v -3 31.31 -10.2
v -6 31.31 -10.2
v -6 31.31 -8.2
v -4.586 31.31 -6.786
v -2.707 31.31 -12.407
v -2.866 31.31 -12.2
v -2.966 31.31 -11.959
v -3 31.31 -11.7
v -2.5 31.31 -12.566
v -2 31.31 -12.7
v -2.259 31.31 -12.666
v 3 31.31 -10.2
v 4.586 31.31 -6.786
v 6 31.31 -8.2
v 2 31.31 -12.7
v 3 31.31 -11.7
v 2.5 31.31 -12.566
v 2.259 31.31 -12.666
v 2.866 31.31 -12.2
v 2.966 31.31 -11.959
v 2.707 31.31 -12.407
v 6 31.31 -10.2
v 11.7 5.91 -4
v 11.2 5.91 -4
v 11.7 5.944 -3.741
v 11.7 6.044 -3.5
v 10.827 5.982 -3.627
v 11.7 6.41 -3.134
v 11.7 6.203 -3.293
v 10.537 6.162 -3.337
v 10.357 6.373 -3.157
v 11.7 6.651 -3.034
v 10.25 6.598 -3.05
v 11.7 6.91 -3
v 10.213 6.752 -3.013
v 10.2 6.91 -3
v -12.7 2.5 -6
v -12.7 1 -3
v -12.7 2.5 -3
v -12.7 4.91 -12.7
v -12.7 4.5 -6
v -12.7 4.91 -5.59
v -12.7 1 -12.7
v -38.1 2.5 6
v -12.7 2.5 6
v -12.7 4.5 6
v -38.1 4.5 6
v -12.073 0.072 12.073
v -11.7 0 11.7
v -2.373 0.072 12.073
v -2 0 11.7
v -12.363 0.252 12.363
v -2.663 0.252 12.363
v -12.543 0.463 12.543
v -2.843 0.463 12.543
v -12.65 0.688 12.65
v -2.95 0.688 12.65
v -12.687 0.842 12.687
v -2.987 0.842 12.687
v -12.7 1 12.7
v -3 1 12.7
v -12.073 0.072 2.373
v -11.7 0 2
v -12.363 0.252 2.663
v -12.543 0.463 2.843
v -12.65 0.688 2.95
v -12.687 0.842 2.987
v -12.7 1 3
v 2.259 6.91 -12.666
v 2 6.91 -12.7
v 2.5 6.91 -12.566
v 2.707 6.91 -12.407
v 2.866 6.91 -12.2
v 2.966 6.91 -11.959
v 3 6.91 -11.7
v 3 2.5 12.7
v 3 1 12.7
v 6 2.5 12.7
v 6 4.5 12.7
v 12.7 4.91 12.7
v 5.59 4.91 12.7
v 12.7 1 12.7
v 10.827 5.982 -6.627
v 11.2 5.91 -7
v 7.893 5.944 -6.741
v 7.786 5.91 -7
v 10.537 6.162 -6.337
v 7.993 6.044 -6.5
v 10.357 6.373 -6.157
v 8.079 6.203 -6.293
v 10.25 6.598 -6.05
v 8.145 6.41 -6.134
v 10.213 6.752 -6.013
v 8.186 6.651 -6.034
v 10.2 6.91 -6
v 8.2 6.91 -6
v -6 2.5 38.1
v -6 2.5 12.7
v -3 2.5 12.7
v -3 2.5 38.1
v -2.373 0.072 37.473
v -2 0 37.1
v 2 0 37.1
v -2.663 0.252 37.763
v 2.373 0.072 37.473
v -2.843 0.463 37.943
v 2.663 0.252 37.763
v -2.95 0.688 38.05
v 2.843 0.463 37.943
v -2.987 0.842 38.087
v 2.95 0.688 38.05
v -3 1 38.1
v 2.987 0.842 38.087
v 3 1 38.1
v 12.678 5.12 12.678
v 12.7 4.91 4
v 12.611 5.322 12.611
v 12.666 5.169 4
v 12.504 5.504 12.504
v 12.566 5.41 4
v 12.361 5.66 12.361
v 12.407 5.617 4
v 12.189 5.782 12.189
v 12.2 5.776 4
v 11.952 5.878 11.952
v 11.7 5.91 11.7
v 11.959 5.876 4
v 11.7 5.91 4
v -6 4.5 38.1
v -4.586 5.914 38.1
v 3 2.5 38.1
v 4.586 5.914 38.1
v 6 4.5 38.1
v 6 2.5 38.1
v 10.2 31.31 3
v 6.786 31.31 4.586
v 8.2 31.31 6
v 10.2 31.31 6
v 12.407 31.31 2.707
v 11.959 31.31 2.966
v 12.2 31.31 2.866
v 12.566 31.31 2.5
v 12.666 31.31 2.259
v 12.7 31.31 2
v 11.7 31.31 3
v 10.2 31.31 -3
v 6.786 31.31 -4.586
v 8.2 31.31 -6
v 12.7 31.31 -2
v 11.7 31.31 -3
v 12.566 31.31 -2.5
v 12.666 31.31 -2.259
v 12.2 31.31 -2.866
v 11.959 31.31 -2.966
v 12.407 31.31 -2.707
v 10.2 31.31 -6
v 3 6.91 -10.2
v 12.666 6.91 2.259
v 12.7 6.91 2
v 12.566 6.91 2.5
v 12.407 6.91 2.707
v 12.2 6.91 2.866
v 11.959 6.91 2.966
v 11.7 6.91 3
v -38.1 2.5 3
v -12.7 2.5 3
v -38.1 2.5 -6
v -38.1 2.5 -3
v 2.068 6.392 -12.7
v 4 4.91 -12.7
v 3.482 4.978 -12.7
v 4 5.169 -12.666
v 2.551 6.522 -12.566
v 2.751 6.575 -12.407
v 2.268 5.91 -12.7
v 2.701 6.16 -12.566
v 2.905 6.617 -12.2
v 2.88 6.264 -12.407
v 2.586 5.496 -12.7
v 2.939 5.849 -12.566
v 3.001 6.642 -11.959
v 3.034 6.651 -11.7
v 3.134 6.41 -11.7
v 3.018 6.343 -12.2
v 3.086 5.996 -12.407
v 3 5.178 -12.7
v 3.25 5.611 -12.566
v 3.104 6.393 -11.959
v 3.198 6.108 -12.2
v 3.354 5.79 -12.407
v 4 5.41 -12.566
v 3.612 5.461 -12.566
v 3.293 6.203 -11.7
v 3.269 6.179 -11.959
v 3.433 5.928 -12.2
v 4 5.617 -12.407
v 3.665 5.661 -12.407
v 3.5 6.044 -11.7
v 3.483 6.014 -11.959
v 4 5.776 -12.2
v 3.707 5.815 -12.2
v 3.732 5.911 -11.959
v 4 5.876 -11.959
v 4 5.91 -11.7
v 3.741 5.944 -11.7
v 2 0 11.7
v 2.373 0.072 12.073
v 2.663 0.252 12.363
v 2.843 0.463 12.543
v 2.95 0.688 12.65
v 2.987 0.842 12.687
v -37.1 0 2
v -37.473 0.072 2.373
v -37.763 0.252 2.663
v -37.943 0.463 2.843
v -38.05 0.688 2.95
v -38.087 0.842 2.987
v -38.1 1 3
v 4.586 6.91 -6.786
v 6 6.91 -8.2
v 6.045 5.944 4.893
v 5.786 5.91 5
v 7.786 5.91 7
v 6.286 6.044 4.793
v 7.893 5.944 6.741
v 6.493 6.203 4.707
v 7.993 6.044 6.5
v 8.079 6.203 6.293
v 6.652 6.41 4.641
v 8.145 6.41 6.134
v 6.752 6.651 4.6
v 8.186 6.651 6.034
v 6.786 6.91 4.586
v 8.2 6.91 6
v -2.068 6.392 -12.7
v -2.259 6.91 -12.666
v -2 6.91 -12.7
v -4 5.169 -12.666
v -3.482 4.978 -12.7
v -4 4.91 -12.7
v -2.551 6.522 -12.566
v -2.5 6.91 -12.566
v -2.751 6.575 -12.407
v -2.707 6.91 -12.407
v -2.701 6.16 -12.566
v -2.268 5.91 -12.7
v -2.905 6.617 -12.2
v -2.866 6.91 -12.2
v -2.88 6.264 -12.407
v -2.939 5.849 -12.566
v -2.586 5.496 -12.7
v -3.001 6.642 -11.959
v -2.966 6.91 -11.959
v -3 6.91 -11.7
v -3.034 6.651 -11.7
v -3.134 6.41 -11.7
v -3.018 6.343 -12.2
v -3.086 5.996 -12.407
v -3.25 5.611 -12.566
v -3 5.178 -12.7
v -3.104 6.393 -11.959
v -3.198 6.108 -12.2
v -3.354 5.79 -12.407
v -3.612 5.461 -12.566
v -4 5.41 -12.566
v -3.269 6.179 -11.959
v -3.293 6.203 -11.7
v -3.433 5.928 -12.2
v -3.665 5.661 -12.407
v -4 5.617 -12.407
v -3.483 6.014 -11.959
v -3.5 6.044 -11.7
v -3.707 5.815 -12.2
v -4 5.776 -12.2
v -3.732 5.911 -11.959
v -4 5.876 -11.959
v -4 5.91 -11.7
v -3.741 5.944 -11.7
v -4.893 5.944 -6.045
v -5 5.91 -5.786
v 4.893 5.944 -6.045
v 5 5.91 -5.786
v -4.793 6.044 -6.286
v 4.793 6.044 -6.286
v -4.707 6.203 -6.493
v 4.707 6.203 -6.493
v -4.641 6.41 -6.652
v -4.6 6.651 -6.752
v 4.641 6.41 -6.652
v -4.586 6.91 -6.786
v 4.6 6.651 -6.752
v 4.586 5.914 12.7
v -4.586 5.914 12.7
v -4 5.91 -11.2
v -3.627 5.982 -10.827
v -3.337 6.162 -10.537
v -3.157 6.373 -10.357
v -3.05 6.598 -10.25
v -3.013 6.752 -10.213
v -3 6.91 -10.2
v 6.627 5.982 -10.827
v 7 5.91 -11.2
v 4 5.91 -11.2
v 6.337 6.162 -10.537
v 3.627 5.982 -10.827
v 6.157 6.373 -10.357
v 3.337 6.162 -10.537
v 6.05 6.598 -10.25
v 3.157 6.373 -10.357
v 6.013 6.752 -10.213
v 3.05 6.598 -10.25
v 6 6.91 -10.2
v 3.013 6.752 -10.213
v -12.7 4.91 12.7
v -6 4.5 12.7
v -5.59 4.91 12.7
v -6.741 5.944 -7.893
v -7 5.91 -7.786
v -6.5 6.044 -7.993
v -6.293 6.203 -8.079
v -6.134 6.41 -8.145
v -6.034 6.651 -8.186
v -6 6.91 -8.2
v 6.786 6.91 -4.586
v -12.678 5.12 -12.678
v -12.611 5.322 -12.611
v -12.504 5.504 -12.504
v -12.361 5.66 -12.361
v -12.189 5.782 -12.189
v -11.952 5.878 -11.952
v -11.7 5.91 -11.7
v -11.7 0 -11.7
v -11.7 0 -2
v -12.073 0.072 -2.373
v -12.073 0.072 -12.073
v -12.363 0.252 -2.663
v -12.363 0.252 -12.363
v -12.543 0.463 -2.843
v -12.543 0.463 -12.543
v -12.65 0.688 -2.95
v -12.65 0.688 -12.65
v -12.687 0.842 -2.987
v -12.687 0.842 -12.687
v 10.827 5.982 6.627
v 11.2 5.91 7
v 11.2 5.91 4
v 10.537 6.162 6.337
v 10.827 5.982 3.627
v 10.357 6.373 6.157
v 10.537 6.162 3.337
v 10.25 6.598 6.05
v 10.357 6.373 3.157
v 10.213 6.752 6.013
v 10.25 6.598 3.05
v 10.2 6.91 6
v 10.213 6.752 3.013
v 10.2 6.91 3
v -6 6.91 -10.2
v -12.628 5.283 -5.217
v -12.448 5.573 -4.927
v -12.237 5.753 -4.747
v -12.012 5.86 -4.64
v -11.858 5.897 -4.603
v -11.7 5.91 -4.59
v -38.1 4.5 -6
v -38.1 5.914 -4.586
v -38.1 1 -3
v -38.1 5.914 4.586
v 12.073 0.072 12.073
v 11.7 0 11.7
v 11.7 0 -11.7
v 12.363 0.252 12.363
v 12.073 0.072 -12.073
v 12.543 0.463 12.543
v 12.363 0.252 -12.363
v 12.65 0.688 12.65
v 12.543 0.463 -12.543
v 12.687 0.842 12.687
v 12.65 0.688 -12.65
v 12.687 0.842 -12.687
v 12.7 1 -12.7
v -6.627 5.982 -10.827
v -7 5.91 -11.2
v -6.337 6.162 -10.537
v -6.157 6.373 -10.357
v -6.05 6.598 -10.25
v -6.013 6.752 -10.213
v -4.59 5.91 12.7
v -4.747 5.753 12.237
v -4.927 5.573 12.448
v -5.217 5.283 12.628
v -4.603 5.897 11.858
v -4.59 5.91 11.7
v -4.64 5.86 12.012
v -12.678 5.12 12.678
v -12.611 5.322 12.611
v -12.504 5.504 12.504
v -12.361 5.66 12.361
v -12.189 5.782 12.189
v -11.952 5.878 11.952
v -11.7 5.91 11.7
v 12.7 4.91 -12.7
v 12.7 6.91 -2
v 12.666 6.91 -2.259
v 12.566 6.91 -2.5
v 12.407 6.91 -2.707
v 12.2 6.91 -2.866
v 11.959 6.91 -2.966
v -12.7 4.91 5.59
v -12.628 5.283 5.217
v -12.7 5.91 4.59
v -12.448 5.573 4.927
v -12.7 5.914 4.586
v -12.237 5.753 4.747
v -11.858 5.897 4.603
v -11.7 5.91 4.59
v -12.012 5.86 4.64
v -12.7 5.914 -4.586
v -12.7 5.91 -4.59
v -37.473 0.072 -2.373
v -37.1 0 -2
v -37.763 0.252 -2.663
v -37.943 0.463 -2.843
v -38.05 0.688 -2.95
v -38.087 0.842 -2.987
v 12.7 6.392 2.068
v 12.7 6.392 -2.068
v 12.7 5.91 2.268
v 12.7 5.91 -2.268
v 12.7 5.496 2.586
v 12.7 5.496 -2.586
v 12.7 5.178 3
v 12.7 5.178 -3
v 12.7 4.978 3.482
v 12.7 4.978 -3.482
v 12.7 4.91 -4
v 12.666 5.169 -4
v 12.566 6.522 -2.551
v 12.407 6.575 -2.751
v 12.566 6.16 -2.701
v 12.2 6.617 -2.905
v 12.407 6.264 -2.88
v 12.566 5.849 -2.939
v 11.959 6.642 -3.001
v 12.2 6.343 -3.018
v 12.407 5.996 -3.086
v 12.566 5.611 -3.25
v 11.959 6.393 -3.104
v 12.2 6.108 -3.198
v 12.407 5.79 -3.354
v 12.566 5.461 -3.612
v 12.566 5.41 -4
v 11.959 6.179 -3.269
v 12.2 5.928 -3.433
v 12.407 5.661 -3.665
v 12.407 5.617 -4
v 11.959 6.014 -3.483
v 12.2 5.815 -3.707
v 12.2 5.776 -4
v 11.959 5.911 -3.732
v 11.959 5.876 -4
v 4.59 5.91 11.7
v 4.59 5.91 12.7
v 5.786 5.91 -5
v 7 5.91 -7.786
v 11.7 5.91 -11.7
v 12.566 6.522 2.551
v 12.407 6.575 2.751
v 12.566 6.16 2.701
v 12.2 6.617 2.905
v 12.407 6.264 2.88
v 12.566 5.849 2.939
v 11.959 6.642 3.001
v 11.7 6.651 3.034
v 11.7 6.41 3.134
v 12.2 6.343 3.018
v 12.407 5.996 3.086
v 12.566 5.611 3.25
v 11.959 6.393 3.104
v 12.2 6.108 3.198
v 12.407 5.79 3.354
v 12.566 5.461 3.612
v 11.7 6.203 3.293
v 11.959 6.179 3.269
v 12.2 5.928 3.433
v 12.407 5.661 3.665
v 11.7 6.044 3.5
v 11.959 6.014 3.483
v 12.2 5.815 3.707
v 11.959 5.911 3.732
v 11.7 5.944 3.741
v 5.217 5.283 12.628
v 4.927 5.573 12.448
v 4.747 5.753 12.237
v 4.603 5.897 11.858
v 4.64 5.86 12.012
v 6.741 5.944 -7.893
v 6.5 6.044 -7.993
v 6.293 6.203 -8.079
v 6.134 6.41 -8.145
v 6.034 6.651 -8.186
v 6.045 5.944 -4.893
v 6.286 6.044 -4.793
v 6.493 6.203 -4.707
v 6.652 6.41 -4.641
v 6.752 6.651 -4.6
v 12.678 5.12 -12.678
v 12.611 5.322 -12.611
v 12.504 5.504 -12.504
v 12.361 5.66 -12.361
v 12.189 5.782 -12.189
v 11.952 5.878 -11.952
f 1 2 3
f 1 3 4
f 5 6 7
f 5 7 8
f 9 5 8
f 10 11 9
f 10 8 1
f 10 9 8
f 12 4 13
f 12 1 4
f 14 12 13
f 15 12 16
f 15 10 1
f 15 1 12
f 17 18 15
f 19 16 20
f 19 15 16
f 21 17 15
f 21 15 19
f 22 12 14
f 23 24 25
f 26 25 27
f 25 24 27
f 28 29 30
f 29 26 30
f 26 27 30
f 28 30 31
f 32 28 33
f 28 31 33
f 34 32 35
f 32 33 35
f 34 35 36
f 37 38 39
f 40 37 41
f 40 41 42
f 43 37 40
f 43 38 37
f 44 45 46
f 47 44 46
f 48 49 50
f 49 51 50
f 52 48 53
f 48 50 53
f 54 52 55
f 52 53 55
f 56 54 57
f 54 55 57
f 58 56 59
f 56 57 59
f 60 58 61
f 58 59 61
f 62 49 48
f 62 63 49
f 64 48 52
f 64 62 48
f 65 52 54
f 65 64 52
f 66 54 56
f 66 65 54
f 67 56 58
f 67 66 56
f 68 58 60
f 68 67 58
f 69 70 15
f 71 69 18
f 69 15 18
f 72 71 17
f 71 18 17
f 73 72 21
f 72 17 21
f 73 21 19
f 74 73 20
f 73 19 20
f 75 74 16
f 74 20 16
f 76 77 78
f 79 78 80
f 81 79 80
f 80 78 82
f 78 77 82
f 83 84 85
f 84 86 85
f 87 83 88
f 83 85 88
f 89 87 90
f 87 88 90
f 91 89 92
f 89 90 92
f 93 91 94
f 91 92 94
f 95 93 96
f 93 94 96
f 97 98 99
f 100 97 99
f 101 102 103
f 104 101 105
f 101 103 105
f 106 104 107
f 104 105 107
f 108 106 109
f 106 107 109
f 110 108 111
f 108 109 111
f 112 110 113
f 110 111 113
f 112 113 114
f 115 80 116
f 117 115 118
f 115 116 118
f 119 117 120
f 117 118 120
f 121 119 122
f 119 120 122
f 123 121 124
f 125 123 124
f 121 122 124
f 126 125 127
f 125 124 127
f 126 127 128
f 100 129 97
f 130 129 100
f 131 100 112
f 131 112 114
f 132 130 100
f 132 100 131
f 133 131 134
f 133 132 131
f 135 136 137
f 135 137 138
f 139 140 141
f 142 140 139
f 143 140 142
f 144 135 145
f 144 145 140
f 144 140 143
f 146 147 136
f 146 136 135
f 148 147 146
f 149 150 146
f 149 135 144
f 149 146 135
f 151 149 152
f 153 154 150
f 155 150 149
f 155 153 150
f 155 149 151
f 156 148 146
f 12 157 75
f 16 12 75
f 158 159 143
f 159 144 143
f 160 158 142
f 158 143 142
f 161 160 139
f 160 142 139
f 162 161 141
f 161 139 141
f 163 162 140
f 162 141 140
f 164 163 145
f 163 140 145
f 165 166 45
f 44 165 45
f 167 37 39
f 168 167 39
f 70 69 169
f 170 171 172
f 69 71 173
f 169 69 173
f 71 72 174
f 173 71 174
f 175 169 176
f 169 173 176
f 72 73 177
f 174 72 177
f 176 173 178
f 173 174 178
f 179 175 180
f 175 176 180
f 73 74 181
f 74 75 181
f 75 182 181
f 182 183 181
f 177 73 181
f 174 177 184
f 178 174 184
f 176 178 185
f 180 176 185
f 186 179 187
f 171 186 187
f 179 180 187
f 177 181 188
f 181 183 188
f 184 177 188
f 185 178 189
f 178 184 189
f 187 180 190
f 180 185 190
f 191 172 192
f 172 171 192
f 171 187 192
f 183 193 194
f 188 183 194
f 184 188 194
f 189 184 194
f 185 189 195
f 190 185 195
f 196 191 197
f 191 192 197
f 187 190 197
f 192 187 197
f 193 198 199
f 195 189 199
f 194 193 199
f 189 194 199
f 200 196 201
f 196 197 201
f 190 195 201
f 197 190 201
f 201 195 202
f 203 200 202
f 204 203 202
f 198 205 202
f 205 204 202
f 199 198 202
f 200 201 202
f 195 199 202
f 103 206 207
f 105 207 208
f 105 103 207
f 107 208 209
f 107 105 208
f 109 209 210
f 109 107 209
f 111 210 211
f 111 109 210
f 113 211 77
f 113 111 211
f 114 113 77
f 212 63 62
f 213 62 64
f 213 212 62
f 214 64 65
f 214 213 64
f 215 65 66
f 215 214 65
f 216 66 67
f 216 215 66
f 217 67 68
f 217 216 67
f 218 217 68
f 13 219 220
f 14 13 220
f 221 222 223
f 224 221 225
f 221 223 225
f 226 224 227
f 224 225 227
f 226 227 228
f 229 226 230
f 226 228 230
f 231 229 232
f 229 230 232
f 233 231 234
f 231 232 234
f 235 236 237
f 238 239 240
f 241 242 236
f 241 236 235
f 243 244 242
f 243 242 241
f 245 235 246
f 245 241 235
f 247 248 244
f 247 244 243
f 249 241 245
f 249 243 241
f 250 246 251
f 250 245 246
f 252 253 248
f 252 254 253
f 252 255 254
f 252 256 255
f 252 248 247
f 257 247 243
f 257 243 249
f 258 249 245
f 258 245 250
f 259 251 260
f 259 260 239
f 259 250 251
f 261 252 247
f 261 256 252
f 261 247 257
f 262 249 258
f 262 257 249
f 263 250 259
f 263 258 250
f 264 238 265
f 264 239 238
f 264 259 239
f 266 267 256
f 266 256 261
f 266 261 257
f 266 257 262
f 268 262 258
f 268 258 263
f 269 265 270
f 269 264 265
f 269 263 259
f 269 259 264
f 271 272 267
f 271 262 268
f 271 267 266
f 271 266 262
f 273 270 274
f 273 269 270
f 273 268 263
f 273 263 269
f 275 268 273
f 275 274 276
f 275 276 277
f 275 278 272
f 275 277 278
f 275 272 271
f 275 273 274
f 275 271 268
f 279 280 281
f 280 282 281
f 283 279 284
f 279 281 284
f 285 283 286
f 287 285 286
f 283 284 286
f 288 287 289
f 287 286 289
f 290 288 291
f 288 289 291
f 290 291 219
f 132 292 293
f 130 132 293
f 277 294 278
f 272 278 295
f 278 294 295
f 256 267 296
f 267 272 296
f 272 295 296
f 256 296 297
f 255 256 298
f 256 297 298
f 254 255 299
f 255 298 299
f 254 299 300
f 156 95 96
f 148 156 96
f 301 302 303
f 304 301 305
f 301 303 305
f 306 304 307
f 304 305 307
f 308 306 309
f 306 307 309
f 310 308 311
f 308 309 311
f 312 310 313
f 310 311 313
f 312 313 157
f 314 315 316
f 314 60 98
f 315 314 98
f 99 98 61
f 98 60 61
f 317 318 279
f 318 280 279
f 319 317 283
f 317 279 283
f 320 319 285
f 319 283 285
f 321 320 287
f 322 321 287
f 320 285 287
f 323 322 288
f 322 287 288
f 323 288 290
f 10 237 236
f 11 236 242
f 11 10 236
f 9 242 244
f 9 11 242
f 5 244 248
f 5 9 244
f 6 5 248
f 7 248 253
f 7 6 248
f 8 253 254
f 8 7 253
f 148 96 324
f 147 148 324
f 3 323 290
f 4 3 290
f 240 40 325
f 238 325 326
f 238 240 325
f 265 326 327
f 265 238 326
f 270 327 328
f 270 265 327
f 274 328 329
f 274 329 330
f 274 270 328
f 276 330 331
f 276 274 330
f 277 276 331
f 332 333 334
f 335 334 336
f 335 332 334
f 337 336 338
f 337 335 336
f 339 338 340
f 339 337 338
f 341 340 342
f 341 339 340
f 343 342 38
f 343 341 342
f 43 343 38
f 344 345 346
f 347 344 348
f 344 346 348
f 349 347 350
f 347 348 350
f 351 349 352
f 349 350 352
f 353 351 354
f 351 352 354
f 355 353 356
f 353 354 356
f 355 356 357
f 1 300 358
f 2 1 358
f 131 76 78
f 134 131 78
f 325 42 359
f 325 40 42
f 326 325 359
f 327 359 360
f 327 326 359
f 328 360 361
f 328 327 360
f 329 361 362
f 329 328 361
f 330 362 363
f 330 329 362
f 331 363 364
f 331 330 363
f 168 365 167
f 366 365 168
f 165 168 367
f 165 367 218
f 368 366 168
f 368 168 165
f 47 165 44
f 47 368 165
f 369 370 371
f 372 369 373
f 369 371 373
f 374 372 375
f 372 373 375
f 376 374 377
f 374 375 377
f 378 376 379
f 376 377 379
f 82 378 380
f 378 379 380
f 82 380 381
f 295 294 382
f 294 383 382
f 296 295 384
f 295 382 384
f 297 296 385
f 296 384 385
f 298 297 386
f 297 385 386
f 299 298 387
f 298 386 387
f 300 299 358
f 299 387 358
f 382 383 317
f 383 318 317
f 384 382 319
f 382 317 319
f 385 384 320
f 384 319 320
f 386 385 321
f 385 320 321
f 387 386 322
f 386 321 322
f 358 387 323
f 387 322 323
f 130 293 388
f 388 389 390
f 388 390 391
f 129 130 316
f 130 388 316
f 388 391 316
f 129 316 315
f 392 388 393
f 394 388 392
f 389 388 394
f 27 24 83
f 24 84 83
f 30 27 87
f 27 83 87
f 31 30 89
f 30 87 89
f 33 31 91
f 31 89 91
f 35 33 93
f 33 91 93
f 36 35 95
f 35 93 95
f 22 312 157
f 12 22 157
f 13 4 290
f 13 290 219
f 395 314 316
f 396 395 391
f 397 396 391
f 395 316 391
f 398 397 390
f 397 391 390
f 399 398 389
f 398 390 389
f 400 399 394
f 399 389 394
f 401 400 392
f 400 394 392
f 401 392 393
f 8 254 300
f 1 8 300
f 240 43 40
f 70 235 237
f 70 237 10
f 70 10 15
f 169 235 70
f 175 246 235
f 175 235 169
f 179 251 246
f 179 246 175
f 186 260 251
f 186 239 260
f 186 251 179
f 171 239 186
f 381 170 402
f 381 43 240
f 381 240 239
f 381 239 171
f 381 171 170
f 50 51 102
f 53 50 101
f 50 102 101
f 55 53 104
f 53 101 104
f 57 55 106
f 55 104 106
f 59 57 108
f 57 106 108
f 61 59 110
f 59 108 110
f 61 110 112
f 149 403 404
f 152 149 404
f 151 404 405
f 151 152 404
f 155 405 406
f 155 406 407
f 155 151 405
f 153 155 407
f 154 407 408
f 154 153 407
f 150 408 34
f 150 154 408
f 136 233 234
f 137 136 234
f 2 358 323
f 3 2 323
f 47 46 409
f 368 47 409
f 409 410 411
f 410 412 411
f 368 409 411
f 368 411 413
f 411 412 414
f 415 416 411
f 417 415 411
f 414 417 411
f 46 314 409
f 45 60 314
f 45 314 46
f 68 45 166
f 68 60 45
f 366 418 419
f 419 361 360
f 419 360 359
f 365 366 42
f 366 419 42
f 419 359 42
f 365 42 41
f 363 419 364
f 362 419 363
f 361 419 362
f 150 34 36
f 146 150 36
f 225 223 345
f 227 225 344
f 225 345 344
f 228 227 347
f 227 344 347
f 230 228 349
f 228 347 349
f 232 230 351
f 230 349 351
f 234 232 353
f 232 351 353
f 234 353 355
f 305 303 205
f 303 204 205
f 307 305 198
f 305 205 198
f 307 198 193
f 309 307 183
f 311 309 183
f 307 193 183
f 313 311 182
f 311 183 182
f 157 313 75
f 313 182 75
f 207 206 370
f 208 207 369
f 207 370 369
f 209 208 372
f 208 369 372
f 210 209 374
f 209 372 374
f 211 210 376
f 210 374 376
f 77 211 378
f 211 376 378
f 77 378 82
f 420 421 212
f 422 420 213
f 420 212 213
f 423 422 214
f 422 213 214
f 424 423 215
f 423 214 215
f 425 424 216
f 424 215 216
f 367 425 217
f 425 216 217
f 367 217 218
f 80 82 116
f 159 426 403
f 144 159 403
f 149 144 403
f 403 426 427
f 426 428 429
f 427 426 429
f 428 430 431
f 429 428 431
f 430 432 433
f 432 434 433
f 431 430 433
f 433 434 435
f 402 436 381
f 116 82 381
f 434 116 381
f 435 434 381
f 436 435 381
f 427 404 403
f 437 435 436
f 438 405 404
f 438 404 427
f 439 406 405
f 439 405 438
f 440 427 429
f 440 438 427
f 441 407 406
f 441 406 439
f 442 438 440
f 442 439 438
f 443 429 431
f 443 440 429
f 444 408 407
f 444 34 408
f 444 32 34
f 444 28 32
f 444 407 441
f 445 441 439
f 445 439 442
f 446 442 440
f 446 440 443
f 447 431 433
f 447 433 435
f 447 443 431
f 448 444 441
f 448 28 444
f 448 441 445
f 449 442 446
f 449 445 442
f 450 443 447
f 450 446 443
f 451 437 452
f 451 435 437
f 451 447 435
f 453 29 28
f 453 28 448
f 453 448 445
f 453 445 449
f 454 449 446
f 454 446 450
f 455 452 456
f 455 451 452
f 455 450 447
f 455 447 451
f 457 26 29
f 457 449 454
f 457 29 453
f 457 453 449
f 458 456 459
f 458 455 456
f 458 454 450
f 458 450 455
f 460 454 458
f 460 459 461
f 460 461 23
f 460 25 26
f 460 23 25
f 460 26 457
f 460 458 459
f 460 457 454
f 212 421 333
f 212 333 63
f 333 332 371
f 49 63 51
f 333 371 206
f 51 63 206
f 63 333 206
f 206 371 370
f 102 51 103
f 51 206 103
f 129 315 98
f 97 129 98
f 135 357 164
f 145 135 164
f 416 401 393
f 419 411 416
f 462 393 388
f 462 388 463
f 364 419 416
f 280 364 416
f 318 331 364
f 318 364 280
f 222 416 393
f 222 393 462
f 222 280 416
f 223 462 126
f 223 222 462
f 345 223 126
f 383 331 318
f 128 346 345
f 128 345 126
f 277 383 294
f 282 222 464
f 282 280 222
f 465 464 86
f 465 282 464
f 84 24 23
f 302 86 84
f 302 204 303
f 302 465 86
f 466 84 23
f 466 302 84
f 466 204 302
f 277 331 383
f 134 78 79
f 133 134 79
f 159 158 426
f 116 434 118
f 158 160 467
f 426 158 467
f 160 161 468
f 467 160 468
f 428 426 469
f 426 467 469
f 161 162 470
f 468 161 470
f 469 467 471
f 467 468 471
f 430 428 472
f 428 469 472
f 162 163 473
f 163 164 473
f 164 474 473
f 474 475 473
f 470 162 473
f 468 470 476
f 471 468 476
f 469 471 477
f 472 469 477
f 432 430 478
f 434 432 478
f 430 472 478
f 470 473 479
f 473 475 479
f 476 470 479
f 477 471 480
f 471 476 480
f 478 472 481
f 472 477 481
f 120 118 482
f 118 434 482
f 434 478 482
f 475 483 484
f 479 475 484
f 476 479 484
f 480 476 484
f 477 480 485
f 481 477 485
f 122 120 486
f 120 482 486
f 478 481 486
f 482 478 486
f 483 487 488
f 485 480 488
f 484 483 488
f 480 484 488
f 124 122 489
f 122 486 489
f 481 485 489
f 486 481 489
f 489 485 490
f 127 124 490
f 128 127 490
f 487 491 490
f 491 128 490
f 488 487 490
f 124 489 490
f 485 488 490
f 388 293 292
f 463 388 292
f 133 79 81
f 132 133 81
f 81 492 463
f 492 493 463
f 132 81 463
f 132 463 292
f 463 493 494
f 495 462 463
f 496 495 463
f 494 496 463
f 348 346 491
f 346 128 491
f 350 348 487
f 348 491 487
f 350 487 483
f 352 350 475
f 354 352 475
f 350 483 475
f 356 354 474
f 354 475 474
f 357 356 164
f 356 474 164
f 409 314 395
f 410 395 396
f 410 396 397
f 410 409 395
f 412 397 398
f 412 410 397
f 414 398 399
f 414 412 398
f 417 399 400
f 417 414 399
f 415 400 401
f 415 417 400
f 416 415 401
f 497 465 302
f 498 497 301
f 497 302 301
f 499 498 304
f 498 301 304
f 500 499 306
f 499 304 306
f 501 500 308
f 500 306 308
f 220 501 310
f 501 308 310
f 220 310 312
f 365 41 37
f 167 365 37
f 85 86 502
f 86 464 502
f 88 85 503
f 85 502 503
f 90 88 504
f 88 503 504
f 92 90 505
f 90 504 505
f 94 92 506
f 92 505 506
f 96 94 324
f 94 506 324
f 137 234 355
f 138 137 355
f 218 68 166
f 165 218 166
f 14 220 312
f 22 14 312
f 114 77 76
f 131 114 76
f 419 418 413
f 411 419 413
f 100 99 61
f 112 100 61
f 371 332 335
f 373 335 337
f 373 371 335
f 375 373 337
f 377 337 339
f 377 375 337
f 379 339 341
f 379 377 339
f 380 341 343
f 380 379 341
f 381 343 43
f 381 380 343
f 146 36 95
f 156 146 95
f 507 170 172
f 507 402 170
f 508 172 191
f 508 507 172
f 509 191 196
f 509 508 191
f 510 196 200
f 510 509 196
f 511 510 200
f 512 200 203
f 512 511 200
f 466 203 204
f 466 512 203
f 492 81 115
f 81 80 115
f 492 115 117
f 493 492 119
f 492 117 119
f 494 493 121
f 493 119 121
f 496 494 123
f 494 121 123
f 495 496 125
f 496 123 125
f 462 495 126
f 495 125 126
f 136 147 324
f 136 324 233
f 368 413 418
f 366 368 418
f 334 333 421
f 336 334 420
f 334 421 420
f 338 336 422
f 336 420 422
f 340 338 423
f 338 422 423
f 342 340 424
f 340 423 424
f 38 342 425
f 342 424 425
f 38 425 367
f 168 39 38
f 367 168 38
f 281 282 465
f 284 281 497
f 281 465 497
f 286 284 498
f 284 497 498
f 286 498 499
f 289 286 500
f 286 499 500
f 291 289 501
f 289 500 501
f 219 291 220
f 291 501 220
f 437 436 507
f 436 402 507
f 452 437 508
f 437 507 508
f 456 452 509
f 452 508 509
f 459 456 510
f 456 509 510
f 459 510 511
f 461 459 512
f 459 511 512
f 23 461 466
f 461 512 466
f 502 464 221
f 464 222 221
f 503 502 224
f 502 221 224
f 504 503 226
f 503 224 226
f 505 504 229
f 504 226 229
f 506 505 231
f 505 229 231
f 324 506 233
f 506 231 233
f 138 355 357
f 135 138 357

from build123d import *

# Parameters (mm, degrees)
SKETCH1_W           = 25.4
SKETCH1_H           = 25.4
BOSS_EXTRUDE1_DEPTH = 5.91
BOSS_EXTRUDE2_DEPTH = 25.4
BOSS_EXTRUDE3_DEPTH = 25.4
BOSS_EXTRUDE4_DEPTH = 25.4
FILLET2_R           = 1


with BuildPart() as part:
    # Sketch1 → Boss-Extrude1 (new body)
    with BuildSketch(Plane(origin=(0, 0, 0), x_dir=(1, 0, 0), z_dir=(0, 1, 0))):
        Rectangle(SKETCH1_W, SKETCH1_H)
    extrude(amount=BOSS_EXTRUDE1_DEPTH)

    # Sketch2 → Boss-Extrude2 (add)
    with BuildSketch(Plane.XY.offset(12.7)):
        Polygon((-3, 0), (3, 0), (3, 2.5), (6, 2.5), (6, 4.5), (4.585786438, 5.914213562), (-4.585786438, 5.914213562), (-6, 4.5), (-6, 2.5), (-3, 2.5), align=None)
    extrude(amount=BOSS_EXTRUDE2_DEPTH)

    # Sketch3 → Boss-Extrude3 (add)
    with BuildSketch(Plane.ZY.offset(12.7)):
        Polygon((-3, 0), (3, 0), (3, 2.5), (6, 2.5), (6, 4.5), (4.585786438, 5.914213562), (-4.585786438, 5.914213562), (-6, 4.5), (-6, 2.5), (-3, 2.5), align=None)
    extrude(amount=BOSS_EXTRUDE3_DEPTH)

    # Sketch5 → Boss-Extrude4 (add)
    with BuildSketch(Plane(origin=(0, 5.91, 0), x_dir=(1, 0, 0), z_dir=(0, 1, 0))):
        Polygon((3, 12.7), (-3, 12.7), (-3, 10.2), (-6, 10.2), (-6, 8.2), (-4.585786438, 6.785786438), (4.585786438, 6.785786438), (6, 8.2), (6, 10.2), (3, 10.2), align=None)
        Polygon((12.7, -3), (12.7, 3), (10.2, 3), (10.2, 6), (8.2, 6), (6.785786438, 4.585786438), (6.785786438, -4.585786438), (8.2, -6), (10.2, -6), (10.2, -3), align=None)
    extrude(amount=BOSS_EXTRUDE4_DEPTH)

    # Fillet2
    fillet2_edges = [part.edges().sort_by_distance(p)[0] for p in [
        (6.785786438, 5.91, 0),
        (7.492893219, 5.91, 5.292893219),
        (9.2, 5.91, 6),
        (10.2, 5.91, 4.5),
        (11.45, 5.91, 3),
        (12.7, 18.61, 3),
        (-12.7, 5.91, -8.645),
        (7.85, 0, 12.7),
        (8.645, 5.91, 12.7),
        (-8.645, 5.91, 12.7),
        (3, 0, 25.4),
        (-3, 0, 25.4),
        (0, 0, 38.1),
        (-12.7, 0, 7.85),
        (-12.7, 5.91, 8.645),
        (-25.4, 0, 3),
        (12.7, 5.91, 7.85),
        (-7.85, 0, 12.7),
        (-12.7, 0, -7.85),
        (-25.4, 0, -3),
        (-38.1, 0, 0),
        (0, 0, -12.7),
        (12.7, 0, 0),
        (12.7, 5.91, -7.85),
        (-7.85, 5.91, -12.7),
        (-3, 5.91, -11.45),
        (-3, 18.61, -12.7),
        (-4.5, 5.91, -10.2),
        (-6, 5.91, -9.2),
        (-5.292893219, 5.91, -7.492893219),
        (0, 5.91, -6.785786438),
        (5.292893219, 5.91, -7.492893219),
        (6, 5.91, -9.2),
        (4.5, 5.91, -10.2),
        (3, 5.91, -11.45),
        (3, 18.61, -12.7),
        (7.85, 5.91, -12.7),
        (11.45, 5.91, -3),
        (12.7, 18.61, -3),
        (10.2, 5.91, -4.5),
        (9.2, 5.91, -6),
        (7.492893219, 5.91, -5.292893219),
    ]]
    fillet(fillet2_edges, radius=FILLET2_R)


solid = part.part
